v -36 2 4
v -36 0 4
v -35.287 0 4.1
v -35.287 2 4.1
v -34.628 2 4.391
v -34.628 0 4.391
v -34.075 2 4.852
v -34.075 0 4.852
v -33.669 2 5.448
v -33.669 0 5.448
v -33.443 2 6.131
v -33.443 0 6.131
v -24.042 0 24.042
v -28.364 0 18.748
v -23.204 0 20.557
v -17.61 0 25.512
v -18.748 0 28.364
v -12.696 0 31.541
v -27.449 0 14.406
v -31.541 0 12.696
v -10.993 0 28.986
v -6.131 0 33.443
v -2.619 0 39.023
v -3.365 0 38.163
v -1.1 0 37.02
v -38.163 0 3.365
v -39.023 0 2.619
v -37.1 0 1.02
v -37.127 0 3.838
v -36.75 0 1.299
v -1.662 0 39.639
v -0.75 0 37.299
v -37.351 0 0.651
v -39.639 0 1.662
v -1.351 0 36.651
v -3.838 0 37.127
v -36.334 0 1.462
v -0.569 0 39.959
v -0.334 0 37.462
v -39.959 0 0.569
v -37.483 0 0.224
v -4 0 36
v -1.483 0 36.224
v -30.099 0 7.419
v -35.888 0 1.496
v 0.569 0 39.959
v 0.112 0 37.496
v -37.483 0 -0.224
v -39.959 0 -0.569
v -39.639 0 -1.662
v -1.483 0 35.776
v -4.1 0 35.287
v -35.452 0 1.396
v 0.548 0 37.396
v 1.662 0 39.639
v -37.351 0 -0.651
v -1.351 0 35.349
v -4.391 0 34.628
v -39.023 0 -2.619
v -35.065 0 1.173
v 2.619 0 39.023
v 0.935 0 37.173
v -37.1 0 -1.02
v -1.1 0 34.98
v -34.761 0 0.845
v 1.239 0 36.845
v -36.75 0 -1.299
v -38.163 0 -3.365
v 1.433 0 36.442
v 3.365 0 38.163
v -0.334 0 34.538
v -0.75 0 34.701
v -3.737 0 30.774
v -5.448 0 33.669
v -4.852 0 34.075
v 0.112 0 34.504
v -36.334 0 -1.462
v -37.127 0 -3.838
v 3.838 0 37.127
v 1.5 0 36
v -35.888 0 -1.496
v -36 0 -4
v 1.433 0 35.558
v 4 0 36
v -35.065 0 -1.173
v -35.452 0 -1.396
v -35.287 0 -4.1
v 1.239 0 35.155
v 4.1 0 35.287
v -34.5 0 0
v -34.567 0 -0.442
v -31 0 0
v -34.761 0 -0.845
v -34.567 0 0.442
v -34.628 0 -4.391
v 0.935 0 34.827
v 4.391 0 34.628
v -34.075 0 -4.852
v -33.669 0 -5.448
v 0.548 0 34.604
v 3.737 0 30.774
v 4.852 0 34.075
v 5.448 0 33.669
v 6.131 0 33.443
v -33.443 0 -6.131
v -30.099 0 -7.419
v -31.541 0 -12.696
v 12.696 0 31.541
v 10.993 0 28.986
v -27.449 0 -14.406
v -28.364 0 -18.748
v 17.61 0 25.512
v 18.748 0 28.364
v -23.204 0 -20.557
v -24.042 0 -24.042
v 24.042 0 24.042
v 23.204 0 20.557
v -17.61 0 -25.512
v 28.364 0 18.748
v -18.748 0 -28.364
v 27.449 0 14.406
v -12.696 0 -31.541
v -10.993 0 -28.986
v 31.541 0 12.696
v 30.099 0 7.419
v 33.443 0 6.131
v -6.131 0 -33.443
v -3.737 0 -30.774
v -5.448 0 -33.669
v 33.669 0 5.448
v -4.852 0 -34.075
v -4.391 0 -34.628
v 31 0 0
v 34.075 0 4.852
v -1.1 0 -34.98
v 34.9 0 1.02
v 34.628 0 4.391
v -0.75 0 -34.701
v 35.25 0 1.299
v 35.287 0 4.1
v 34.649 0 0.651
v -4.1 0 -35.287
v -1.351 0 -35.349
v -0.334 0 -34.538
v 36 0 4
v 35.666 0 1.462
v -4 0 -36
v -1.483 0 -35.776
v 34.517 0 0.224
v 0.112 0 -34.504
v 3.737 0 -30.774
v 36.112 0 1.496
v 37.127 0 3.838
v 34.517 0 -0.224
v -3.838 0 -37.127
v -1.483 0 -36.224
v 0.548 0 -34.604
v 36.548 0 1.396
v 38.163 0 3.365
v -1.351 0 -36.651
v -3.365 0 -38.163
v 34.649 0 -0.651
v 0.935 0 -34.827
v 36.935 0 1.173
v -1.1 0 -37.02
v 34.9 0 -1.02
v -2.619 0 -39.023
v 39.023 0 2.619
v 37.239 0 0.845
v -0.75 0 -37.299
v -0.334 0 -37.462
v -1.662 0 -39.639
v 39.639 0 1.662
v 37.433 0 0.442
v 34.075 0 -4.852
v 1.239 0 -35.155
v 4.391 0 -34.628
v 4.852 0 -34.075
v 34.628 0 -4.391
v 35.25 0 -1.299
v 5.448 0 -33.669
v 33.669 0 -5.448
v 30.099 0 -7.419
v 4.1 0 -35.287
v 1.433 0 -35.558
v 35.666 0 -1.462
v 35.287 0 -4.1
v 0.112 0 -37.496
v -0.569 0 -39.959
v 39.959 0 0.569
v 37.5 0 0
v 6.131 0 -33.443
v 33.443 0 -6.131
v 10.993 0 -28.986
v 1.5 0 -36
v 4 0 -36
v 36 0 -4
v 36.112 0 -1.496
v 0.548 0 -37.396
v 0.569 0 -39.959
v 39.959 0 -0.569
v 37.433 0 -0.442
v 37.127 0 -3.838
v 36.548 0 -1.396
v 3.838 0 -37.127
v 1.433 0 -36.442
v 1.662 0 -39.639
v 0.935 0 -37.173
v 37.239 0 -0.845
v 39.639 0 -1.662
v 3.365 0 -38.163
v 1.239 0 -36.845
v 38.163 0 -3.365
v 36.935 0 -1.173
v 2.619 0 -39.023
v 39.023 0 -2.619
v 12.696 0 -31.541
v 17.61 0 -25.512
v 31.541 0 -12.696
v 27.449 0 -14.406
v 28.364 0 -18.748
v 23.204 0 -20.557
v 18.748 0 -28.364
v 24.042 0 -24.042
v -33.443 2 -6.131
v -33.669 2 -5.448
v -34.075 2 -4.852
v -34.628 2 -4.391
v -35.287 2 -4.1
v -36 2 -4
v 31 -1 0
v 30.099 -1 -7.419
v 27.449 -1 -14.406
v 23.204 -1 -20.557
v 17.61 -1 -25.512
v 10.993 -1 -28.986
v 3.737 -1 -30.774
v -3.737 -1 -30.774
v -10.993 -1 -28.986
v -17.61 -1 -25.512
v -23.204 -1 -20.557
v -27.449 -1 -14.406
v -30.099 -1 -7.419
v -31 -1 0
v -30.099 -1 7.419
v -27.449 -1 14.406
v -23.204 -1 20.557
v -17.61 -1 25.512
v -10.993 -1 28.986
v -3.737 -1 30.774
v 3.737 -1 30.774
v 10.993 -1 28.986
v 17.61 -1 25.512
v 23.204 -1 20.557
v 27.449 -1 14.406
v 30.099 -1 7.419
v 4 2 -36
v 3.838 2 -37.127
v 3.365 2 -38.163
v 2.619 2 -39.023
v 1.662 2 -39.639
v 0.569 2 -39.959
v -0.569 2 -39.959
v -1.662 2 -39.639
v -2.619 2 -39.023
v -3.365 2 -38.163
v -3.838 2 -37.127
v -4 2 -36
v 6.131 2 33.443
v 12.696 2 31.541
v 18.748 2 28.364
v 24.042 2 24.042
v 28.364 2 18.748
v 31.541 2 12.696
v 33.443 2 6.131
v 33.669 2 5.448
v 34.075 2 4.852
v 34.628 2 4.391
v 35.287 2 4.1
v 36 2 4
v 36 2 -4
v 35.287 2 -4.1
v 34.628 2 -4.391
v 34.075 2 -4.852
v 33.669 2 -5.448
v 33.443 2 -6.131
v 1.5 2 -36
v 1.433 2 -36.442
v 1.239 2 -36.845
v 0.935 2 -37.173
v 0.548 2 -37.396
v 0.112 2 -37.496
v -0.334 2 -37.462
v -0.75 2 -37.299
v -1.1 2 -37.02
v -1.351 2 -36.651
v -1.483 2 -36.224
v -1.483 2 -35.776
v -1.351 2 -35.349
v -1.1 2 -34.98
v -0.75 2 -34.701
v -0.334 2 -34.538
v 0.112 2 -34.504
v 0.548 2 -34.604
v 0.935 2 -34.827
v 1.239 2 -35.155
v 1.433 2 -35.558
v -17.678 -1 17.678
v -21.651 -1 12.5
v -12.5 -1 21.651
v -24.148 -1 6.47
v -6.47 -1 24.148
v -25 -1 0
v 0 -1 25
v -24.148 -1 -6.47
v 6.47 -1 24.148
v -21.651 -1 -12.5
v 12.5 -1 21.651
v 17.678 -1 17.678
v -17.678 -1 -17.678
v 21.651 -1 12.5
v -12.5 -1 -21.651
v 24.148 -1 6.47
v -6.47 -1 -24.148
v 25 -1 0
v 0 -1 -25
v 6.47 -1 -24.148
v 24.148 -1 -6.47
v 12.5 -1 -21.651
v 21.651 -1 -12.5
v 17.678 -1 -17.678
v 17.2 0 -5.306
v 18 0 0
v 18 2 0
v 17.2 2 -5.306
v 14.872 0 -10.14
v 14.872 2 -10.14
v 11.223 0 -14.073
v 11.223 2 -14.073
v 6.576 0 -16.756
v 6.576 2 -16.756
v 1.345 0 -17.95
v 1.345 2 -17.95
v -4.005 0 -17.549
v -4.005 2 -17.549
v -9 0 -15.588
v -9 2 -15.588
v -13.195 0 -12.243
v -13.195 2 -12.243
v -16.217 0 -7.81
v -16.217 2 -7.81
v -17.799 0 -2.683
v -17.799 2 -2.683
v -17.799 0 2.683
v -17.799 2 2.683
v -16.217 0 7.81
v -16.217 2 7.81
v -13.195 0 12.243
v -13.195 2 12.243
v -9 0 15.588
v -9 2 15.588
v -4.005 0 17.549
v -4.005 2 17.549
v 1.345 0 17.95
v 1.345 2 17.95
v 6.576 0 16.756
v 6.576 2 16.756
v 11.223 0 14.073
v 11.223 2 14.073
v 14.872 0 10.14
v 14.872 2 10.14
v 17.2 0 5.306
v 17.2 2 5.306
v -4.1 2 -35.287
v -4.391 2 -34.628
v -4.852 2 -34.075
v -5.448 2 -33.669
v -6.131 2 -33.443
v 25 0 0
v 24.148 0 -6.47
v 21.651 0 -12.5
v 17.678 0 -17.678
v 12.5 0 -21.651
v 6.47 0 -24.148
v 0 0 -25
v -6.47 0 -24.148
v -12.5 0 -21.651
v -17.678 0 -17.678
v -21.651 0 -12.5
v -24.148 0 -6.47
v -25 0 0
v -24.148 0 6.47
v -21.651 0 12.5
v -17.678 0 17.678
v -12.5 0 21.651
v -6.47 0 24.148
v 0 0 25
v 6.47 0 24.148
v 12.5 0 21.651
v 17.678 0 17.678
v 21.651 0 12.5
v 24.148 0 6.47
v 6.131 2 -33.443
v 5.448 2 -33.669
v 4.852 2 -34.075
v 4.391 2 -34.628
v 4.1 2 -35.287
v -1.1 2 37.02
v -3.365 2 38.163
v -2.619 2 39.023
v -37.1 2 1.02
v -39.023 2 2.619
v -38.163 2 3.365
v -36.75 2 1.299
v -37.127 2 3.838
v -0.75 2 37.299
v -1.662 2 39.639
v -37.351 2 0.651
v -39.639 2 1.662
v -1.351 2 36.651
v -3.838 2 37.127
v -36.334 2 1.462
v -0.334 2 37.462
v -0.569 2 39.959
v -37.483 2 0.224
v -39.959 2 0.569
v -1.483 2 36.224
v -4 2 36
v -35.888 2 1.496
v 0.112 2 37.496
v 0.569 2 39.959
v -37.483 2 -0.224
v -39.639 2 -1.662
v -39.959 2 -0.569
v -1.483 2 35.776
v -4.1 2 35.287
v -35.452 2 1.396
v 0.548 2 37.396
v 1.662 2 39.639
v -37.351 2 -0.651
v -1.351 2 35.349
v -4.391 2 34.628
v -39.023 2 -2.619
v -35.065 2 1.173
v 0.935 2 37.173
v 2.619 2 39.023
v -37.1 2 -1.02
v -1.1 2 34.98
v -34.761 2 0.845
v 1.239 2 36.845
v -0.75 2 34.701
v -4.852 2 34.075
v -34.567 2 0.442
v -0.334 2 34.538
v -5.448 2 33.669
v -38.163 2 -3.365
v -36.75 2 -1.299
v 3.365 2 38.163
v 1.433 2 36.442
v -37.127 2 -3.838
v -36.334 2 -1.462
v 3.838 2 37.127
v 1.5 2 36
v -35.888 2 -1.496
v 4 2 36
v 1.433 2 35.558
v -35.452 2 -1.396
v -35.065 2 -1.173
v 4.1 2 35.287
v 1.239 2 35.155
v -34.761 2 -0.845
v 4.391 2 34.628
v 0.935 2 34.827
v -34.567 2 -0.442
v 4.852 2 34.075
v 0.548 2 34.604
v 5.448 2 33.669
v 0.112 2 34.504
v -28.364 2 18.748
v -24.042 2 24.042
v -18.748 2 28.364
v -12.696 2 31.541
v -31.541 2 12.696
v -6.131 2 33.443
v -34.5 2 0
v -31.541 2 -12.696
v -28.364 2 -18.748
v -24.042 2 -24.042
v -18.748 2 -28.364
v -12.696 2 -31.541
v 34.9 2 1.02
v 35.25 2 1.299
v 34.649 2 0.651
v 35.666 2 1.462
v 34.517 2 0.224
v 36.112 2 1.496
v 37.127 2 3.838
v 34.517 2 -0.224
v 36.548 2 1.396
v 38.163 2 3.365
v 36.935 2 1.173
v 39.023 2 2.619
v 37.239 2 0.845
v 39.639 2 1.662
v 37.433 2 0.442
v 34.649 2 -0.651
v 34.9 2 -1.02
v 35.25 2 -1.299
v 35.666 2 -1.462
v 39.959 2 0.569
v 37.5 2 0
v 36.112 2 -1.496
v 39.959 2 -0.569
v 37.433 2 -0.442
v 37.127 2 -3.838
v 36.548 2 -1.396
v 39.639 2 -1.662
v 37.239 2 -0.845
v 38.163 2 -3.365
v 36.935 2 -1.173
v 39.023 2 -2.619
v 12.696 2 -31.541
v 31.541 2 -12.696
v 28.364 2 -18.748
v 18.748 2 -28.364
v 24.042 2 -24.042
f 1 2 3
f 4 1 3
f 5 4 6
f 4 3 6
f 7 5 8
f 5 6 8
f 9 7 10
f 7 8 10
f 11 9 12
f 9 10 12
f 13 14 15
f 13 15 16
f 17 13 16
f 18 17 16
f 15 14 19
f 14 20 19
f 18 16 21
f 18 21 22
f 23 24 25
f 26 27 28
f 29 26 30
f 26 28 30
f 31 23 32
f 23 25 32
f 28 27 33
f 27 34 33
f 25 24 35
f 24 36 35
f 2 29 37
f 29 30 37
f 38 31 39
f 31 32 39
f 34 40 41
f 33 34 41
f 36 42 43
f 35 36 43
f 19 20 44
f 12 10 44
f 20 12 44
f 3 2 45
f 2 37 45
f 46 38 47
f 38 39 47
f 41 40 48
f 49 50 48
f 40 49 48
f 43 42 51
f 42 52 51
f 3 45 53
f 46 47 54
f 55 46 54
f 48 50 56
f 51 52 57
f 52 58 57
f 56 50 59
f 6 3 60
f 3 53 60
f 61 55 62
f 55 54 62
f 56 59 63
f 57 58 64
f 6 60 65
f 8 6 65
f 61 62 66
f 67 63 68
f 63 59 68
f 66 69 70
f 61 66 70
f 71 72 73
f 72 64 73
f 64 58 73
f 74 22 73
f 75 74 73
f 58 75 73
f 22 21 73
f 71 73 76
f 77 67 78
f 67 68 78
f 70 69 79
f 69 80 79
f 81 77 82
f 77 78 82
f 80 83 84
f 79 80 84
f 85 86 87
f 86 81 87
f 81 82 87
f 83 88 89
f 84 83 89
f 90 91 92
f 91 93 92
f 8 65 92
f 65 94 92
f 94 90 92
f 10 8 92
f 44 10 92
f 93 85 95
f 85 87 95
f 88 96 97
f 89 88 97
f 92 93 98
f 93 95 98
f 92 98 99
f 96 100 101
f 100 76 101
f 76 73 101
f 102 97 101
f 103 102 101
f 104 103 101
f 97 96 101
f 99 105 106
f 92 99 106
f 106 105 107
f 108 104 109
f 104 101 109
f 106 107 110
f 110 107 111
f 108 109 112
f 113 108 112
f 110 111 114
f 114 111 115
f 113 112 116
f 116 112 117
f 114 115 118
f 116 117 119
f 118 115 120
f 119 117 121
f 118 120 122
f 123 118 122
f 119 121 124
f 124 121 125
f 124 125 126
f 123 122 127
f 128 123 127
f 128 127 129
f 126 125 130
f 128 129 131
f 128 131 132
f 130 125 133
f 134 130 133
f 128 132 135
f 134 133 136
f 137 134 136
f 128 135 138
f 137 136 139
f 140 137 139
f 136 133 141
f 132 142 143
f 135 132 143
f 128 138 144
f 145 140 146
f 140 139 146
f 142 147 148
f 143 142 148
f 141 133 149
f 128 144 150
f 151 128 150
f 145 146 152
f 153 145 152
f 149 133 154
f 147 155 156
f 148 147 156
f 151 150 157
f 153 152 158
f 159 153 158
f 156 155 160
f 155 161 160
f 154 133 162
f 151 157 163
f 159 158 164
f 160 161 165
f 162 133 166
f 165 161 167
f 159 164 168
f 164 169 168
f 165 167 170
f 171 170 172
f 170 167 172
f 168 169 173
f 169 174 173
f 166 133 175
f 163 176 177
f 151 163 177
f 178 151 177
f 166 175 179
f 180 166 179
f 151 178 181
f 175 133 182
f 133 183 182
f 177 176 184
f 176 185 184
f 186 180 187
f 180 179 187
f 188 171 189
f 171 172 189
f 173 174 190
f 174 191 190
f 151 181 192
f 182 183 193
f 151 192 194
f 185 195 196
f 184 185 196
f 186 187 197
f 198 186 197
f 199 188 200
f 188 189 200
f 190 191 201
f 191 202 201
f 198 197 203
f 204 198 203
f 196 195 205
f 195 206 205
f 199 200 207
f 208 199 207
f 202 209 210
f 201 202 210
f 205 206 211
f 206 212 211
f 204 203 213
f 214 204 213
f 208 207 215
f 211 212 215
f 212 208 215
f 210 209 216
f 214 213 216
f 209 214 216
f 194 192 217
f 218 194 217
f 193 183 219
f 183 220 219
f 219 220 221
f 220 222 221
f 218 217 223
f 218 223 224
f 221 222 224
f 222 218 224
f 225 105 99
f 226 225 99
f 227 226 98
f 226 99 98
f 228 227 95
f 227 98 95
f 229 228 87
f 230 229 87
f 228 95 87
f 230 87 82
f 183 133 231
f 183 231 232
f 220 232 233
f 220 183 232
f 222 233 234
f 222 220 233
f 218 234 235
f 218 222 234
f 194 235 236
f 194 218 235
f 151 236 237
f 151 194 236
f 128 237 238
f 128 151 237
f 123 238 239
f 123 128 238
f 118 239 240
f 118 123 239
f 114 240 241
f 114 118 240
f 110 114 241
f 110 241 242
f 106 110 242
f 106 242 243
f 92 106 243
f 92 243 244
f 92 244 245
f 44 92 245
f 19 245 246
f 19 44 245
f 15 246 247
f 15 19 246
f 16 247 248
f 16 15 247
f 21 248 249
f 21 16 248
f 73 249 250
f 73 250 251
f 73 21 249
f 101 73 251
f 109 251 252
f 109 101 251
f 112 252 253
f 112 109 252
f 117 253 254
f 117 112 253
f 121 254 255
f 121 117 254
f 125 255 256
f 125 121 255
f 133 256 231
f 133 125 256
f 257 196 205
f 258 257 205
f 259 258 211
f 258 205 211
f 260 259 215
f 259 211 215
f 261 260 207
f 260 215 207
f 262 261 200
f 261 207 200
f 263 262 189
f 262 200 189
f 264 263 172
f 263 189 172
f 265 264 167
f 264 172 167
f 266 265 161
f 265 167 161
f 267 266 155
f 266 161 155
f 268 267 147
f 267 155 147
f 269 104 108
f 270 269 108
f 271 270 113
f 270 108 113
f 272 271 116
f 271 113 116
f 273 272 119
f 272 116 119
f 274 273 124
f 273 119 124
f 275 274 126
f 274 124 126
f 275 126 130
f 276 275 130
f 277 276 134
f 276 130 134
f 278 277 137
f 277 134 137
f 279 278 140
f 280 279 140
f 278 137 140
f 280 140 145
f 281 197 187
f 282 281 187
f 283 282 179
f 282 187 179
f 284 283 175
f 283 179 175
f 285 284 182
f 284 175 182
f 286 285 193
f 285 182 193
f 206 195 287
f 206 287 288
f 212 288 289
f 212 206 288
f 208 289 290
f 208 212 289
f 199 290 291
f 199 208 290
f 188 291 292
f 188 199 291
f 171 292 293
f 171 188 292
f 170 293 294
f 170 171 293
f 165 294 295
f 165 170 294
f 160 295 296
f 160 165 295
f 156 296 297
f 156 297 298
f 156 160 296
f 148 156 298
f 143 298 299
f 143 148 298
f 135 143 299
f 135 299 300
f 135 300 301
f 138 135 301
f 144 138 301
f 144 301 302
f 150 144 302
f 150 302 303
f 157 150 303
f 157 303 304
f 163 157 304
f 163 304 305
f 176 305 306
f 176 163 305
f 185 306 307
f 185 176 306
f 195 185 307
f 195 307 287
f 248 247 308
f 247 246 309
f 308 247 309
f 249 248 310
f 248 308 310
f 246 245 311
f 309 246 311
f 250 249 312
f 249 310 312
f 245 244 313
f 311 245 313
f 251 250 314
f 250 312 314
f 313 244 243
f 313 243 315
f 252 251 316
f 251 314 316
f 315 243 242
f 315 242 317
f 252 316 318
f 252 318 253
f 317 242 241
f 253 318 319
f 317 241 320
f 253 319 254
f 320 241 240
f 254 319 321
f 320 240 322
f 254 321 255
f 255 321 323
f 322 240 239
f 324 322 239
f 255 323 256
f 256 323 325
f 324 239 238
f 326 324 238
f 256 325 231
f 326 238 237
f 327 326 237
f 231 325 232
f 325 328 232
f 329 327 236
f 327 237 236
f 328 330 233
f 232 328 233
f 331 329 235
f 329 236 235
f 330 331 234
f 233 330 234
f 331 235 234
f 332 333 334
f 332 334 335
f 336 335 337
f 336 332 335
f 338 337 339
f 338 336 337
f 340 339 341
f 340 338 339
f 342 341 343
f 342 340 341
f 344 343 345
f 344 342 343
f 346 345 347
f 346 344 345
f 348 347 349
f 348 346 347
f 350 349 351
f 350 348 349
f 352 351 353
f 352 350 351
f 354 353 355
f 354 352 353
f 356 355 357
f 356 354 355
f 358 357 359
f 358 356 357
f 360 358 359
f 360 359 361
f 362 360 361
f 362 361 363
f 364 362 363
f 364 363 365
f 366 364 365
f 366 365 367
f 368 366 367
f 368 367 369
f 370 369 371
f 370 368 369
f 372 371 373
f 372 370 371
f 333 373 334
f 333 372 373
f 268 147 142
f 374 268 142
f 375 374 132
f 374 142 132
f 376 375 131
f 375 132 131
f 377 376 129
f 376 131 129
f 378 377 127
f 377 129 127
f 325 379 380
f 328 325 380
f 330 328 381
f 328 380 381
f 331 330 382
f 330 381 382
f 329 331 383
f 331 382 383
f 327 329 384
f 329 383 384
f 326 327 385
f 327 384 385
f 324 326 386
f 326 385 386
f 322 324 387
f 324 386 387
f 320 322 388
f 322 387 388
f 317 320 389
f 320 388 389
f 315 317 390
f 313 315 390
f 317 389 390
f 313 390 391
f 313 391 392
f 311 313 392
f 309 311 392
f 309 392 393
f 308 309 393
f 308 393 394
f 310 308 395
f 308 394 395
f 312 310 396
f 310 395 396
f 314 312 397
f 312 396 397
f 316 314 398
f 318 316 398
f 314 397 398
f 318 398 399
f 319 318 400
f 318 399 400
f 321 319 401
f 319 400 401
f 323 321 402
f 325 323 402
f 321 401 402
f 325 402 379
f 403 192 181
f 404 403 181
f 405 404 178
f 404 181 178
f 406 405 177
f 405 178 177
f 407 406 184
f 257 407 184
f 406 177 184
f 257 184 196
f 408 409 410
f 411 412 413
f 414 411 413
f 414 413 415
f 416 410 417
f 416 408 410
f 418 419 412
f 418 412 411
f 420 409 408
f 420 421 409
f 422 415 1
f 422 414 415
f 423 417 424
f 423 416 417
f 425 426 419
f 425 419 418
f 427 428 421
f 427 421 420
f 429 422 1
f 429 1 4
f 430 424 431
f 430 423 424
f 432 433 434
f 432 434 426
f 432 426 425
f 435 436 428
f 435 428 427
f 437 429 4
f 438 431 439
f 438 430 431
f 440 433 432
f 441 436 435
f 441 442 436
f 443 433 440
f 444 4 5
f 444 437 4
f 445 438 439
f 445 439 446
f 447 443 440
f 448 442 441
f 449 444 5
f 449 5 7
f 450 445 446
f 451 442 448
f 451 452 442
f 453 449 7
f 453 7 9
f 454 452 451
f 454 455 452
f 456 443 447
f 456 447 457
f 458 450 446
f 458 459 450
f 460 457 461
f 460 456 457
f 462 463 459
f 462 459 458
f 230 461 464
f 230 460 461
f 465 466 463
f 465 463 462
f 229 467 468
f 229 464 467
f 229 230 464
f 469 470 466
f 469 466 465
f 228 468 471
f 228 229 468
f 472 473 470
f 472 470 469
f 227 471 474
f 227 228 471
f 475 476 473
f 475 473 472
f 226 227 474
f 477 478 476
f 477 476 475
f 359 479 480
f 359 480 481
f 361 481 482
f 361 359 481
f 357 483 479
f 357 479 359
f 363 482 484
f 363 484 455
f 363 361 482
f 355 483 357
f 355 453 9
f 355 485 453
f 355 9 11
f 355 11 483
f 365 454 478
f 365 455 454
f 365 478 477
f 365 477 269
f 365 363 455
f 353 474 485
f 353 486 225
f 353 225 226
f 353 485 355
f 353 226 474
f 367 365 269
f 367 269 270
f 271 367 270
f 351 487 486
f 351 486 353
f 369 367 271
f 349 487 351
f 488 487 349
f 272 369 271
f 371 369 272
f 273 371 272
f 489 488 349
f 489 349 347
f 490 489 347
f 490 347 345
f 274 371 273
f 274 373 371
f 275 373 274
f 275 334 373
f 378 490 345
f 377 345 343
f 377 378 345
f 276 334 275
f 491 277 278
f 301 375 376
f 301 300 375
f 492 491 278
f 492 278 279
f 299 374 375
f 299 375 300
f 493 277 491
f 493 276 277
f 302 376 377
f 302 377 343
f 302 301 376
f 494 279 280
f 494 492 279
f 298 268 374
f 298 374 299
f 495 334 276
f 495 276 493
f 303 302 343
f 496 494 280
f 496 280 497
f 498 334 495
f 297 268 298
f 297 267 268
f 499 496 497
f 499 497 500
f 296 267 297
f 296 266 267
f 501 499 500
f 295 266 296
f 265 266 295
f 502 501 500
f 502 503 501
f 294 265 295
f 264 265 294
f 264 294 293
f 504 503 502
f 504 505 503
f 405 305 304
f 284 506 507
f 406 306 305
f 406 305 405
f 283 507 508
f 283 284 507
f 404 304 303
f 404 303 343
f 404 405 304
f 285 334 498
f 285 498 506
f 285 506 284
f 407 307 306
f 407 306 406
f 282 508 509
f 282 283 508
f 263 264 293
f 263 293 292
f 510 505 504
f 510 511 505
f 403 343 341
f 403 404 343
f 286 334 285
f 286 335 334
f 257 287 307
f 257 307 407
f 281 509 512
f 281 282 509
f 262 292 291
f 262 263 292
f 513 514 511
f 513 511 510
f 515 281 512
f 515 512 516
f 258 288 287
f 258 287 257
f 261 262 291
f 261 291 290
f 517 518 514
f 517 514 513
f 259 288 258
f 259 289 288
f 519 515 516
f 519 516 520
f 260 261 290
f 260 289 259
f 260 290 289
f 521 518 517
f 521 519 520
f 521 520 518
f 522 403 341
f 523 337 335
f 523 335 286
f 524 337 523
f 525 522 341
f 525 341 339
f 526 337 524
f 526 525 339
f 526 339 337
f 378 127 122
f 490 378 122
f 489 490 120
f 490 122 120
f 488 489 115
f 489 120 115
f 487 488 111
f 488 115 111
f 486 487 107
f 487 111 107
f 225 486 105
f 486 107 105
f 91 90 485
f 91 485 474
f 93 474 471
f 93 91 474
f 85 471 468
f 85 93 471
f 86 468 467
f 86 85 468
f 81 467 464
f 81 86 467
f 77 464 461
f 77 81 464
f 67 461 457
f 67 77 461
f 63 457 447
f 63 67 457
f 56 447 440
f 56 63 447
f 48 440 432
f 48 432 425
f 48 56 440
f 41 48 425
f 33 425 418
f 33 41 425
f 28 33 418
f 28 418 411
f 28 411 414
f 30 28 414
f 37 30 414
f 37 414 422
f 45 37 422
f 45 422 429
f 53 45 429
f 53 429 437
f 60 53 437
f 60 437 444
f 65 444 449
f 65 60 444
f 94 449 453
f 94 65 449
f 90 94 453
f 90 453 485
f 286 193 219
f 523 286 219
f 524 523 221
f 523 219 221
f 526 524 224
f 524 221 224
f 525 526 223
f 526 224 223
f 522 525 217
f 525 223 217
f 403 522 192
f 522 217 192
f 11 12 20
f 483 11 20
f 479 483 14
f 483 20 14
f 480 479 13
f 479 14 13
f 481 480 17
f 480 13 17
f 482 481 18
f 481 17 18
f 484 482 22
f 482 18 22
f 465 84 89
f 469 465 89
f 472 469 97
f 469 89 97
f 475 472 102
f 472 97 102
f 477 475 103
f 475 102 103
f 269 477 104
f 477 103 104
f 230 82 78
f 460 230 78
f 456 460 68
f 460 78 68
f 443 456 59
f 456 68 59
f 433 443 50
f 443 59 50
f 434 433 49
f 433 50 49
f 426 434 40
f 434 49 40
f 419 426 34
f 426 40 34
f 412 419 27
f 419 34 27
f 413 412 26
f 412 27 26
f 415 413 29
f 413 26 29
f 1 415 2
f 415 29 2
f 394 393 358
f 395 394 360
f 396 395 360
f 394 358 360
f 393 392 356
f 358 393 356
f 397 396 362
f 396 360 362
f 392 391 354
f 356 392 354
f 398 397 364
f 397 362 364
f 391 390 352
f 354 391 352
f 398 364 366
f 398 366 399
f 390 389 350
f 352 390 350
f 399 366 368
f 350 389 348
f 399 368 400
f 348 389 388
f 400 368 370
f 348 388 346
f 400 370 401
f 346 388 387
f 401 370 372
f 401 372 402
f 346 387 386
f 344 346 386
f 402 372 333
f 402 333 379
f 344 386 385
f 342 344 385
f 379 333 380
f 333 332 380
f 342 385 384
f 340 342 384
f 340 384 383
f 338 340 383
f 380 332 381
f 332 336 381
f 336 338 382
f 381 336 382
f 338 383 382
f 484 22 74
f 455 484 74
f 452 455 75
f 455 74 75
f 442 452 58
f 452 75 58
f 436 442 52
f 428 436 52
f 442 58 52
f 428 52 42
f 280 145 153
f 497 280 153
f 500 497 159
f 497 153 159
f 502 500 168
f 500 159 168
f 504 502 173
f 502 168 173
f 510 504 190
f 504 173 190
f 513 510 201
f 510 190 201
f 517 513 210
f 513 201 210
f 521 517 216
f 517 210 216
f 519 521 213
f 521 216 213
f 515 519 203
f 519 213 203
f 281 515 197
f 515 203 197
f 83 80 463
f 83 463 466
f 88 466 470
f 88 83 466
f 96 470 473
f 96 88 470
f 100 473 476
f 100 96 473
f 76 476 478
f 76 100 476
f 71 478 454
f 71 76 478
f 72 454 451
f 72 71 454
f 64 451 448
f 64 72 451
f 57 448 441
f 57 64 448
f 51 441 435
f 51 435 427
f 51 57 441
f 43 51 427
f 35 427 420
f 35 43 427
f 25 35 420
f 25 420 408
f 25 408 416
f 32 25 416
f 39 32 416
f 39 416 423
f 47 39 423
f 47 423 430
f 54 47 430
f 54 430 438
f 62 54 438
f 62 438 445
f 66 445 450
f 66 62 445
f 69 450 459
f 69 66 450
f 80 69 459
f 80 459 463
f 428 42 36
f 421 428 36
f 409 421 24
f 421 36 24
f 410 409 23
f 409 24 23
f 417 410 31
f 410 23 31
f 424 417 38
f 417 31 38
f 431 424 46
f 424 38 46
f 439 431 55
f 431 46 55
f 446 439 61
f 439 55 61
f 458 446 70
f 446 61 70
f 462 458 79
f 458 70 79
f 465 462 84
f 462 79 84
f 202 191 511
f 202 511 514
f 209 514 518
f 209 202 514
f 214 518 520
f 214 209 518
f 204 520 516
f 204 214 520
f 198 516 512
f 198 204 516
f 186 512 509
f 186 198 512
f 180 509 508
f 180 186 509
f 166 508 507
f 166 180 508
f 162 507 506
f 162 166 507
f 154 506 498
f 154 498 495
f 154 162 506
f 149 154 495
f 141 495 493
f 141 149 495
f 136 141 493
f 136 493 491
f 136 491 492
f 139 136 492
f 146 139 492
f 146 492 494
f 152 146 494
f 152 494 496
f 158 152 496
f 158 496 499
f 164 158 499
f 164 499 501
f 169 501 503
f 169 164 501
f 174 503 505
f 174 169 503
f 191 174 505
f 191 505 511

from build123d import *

# Parameters (mm, degrees)
SKETCH1_R           = 1.5
SKETCH1_R_2         = 18
BOSS_EXTRUDE1_DEPTH = 2
SKETCH1_3_R         = 31
SKETCH1_3_R_2       = 25
BOSS_EXTRUDE2_DEPTH = 1


with BuildPart() as part:
    # Sketch1 → Boss-Extrude1 (new body)
    with BuildSketch(Plane(origin=(0, 0, 0), x_dir=(1, 0, 0), z_dir=(0, 1, 0))):
        with BuildLine():
            ThreePointArc((33.442622951, 6.131147541), (24.04163056, 24.04163056), (6.131147541, 33.442622951))
            ThreePointArc((6.131147541, 33.442622951), (4.602624673, 34.335520561), (4, 36))
            ThreePointArc((4, 36), (0, 40), (-4, 36))
            ThreePointArc((-4, 36), (-4.602624673, 34.335520561), (-6.131147541, 33.442622951))
            ThreePointArc((-6.131147541, 33.442622951), (-24.04163056, 24.04163056), (-33.442622951, 6.131147541))
            ThreePointArc((-33.442622951, 6.131147541), (-34.335520561, 4.602624673), (-36, 4))
            ThreePointArc((-36, 4), (-40, 0), (-36, -4))
            ThreePointArc((-36, -4), (-34.335520561, -4.602624673), (-33.442622951, -6.131147541))
            ThreePointArc((-33.442622951, -6.131147541), (-24.04163056, -24.04163056), (-6.131147541, -33.442622951))
            ThreePointArc((-6.131147541, -33.442622951), (-4.602624673, -34.335520561), (-4, -36))
            ThreePointArc((-4, -36), (0, -40), (4, -36))
            ThreePointArc((4, -36), (4.602624673, -34.335520561), (6.131147541, -33.442622951))
            ThreePointArc((6.131147541, -33.442622951), (24.04163056, -24.04163056), (33.442622951, -6.131147541))
            ThreePointArc((33.442622951, -6.131147541), (34.335520561, -4.602624673), (36, -4))
            ThreePointArc((36, -4), (40, 0), (36, 4))
            ThreePointArc((36, 4), (34.335520561, 4.602624673), (33.442622951, 6.131147541))
        make_face()
        with Locations((36, 0)):
            Circle(SKETCH1_R, mode=Mode.SUBTRACT)
        with Locations((0, -36)):
            Circle(SKETCH1_R, mode=Mode.SUBTRACT)
        with Locations((0, 36)):
            Circle(SKETCH1_R, mode=Mode.SUBTRACT)
        with Locations((-36, 0)):
            Circle(SKETCH1_R, mode=Mode.SUBTRACT)
        Circle(SKETCH1_R_2, mode=Mode.SUBTRACT)
    extrude(amount=BOSS_EXTRUDE1_DEPTH)

    # Sketch1<3> → Boss-Extrude2 (add)
    with BuildSketch(Plane(origin=(0, 0, 0), x_dir=(1, 0, 0), z_dir=(0, 1, 0))):
        Circle(SKETCH1_3_R)
        Circle(SKETCH1_3_R_2, mode=Mode.SUBTRACT)
    extrude(amount=-BOSS_EXTRUDE2_DEPTH)


solid = part.part
